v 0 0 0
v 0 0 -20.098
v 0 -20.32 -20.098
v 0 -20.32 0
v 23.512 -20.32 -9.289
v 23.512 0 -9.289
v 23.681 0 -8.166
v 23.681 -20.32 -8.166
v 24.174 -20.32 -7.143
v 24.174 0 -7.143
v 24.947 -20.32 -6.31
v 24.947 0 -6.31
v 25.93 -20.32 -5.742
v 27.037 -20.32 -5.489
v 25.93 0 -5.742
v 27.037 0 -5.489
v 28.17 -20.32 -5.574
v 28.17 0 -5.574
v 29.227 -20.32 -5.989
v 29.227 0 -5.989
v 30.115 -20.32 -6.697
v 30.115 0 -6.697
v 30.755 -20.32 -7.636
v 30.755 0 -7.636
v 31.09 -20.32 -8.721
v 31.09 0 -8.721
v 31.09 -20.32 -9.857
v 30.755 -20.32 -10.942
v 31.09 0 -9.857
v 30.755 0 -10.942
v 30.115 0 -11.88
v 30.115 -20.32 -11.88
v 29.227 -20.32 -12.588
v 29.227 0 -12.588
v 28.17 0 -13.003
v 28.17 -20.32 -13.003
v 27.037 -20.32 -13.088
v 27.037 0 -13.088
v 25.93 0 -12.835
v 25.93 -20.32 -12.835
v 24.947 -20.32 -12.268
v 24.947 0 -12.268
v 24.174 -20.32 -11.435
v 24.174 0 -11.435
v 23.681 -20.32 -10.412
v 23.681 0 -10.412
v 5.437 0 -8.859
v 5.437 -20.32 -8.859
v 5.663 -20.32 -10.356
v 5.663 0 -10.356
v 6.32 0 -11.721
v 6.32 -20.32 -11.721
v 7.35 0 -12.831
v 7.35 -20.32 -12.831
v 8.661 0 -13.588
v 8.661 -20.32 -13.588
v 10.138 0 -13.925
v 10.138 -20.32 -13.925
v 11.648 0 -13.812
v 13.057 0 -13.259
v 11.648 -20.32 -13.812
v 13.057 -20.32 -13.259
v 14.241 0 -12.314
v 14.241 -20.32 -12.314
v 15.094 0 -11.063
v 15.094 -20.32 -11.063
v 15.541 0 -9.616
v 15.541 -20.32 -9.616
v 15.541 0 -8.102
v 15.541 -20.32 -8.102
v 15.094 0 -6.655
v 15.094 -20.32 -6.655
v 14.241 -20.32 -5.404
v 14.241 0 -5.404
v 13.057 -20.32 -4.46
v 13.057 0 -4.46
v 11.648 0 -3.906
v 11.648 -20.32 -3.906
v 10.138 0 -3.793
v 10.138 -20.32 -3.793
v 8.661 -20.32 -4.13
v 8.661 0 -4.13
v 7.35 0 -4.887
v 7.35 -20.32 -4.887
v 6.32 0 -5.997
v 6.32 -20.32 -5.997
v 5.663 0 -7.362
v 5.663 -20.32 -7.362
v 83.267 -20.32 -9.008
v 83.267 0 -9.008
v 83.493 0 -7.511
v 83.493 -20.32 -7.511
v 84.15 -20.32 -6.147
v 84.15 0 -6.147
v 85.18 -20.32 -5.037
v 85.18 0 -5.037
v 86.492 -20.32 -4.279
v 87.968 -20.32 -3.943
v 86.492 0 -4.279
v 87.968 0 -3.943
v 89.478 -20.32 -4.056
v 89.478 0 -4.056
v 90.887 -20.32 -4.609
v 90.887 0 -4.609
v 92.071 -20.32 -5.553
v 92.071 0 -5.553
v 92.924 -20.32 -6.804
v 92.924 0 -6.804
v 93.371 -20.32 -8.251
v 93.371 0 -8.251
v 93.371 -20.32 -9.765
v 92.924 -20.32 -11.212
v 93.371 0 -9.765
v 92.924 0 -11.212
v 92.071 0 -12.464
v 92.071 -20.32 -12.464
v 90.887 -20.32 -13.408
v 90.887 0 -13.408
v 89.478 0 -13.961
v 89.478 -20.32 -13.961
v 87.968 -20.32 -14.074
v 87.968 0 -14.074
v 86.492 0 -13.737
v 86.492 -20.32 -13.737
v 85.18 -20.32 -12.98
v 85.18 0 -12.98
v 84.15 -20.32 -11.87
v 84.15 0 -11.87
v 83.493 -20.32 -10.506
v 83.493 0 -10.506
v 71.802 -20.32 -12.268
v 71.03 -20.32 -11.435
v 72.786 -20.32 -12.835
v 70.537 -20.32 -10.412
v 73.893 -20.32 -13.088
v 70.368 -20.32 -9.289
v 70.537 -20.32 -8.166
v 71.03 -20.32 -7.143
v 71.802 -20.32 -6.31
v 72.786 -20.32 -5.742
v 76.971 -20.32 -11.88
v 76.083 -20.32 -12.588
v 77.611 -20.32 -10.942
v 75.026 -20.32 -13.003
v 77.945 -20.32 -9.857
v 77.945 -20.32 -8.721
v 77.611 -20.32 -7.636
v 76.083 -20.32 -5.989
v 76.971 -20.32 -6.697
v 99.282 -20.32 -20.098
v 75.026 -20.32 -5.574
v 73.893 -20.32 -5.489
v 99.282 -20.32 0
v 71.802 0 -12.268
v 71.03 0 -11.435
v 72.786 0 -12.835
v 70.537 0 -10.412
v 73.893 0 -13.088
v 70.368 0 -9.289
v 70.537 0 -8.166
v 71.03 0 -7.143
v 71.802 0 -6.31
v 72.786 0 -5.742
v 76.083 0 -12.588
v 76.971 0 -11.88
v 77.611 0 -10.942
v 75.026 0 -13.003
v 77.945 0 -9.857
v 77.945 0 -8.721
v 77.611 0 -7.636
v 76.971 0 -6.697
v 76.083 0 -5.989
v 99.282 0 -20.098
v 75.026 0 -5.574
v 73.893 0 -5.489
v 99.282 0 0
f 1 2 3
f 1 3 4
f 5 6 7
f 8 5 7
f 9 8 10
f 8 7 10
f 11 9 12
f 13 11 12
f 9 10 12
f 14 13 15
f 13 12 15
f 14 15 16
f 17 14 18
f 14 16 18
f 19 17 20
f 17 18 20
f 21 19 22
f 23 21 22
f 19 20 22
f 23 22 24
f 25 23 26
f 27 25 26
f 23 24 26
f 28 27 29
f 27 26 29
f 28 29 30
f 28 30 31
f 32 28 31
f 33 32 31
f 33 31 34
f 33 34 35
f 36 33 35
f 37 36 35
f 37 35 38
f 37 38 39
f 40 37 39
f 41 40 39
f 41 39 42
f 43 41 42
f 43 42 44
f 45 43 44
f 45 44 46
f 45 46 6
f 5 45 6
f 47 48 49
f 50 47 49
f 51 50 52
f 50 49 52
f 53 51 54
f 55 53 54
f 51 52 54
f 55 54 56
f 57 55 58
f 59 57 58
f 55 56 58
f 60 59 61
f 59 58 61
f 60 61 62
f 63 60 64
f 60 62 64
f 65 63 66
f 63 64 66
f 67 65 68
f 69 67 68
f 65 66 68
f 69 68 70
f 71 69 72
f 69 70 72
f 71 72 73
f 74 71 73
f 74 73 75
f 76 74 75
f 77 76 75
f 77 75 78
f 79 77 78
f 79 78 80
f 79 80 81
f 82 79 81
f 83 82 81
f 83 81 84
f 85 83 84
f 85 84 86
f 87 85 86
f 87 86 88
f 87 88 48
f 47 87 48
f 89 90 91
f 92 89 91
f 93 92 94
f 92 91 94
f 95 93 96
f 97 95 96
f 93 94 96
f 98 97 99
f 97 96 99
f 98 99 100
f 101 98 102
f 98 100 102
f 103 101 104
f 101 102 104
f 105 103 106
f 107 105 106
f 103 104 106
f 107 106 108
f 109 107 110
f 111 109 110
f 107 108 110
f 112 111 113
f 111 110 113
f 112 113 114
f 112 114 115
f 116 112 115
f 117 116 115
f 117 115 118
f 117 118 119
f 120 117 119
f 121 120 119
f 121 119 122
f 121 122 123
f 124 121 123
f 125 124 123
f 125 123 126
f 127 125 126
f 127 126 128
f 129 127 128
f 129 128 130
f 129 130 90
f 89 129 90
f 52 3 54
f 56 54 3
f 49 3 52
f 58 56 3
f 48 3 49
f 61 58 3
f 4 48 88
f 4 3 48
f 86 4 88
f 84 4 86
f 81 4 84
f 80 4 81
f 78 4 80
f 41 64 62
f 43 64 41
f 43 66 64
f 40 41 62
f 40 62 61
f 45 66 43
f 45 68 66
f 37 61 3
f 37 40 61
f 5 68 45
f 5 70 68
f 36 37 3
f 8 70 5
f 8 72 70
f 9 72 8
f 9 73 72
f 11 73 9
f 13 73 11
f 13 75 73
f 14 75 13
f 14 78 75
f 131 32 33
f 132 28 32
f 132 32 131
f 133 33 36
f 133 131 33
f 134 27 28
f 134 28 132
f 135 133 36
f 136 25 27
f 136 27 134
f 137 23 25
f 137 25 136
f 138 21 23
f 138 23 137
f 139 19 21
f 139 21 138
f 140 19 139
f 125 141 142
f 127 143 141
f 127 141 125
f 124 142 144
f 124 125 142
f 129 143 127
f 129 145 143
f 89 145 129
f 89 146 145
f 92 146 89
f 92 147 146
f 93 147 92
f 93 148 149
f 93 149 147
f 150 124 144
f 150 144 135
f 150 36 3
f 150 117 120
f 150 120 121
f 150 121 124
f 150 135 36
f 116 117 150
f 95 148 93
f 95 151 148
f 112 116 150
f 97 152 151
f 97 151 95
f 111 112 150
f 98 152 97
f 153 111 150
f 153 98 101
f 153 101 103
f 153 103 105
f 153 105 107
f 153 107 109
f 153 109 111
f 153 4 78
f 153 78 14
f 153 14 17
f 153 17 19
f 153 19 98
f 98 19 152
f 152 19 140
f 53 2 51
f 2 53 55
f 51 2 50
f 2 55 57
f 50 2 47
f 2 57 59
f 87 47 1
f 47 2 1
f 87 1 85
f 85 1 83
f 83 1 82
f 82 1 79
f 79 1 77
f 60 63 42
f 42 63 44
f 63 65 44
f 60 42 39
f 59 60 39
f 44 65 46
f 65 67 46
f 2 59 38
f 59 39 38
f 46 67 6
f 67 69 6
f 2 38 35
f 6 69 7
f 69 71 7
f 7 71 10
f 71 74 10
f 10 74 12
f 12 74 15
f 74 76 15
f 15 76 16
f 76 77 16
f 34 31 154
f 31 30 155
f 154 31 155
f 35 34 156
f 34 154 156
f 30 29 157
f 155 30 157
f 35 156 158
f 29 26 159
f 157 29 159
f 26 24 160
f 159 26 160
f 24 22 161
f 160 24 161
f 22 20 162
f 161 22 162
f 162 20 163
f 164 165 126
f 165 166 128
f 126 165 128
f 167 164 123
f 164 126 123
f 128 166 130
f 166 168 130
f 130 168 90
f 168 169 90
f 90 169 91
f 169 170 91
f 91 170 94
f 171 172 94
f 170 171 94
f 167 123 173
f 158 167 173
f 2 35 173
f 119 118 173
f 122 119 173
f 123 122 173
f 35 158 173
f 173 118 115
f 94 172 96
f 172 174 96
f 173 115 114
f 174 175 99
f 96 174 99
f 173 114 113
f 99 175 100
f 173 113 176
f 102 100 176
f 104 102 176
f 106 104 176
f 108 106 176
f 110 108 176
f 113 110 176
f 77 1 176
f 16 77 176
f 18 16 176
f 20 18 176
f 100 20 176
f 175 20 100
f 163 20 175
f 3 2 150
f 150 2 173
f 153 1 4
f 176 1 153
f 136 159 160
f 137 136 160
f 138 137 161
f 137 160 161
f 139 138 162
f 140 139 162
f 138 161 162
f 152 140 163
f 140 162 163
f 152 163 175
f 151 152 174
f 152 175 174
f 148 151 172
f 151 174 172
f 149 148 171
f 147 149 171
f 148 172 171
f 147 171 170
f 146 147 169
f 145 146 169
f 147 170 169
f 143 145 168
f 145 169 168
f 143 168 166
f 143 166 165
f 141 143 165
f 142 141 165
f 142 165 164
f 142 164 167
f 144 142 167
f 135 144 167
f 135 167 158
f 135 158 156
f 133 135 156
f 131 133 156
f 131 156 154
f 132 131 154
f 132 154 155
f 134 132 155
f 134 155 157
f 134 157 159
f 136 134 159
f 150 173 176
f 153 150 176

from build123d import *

# Parameters (mm, degrees)
F0_W     = 99.2823541164
F0_H     = 20.0983081013
F1_DEPTH = 20.32
F3_D     = 10.16
F5_D     = 10.16
F7_D     = 7.62


with BuildPart() as f1:
    # F0 (on Front) → F1 (new body)
    with BuildSketch(Plane.XZ):
        with Locations((49.6411770582, -10.0491540506)):
            Rectangle(F0_W, F0_H)
    extrude(amount=F1_DEPTH)

    # F3 (through all)
    with Locations(Plane(origin=(0, 0, 0), x_dir=(1, 0, 0), z_dir=(0, 1, 0))):
        with Locations((10.5173690245, 8.8591091335)):
            Hole(F3_D / 2)

    # F5 (through all)
    with Locations(Plane.XZ.offset(20.32)):
        with Locations((88.3474946022, -9.0083088726)):
            Hole(F5_D / 2)

    # F7 (through all)
    with Locations(Plane.XZ.offset(20.32)):
        with Locations((27.3221246898, -9.2888381332), (74.1779506207, -9.2888381332)):
            Hole(F7_D / 2)


solid = f1.part
